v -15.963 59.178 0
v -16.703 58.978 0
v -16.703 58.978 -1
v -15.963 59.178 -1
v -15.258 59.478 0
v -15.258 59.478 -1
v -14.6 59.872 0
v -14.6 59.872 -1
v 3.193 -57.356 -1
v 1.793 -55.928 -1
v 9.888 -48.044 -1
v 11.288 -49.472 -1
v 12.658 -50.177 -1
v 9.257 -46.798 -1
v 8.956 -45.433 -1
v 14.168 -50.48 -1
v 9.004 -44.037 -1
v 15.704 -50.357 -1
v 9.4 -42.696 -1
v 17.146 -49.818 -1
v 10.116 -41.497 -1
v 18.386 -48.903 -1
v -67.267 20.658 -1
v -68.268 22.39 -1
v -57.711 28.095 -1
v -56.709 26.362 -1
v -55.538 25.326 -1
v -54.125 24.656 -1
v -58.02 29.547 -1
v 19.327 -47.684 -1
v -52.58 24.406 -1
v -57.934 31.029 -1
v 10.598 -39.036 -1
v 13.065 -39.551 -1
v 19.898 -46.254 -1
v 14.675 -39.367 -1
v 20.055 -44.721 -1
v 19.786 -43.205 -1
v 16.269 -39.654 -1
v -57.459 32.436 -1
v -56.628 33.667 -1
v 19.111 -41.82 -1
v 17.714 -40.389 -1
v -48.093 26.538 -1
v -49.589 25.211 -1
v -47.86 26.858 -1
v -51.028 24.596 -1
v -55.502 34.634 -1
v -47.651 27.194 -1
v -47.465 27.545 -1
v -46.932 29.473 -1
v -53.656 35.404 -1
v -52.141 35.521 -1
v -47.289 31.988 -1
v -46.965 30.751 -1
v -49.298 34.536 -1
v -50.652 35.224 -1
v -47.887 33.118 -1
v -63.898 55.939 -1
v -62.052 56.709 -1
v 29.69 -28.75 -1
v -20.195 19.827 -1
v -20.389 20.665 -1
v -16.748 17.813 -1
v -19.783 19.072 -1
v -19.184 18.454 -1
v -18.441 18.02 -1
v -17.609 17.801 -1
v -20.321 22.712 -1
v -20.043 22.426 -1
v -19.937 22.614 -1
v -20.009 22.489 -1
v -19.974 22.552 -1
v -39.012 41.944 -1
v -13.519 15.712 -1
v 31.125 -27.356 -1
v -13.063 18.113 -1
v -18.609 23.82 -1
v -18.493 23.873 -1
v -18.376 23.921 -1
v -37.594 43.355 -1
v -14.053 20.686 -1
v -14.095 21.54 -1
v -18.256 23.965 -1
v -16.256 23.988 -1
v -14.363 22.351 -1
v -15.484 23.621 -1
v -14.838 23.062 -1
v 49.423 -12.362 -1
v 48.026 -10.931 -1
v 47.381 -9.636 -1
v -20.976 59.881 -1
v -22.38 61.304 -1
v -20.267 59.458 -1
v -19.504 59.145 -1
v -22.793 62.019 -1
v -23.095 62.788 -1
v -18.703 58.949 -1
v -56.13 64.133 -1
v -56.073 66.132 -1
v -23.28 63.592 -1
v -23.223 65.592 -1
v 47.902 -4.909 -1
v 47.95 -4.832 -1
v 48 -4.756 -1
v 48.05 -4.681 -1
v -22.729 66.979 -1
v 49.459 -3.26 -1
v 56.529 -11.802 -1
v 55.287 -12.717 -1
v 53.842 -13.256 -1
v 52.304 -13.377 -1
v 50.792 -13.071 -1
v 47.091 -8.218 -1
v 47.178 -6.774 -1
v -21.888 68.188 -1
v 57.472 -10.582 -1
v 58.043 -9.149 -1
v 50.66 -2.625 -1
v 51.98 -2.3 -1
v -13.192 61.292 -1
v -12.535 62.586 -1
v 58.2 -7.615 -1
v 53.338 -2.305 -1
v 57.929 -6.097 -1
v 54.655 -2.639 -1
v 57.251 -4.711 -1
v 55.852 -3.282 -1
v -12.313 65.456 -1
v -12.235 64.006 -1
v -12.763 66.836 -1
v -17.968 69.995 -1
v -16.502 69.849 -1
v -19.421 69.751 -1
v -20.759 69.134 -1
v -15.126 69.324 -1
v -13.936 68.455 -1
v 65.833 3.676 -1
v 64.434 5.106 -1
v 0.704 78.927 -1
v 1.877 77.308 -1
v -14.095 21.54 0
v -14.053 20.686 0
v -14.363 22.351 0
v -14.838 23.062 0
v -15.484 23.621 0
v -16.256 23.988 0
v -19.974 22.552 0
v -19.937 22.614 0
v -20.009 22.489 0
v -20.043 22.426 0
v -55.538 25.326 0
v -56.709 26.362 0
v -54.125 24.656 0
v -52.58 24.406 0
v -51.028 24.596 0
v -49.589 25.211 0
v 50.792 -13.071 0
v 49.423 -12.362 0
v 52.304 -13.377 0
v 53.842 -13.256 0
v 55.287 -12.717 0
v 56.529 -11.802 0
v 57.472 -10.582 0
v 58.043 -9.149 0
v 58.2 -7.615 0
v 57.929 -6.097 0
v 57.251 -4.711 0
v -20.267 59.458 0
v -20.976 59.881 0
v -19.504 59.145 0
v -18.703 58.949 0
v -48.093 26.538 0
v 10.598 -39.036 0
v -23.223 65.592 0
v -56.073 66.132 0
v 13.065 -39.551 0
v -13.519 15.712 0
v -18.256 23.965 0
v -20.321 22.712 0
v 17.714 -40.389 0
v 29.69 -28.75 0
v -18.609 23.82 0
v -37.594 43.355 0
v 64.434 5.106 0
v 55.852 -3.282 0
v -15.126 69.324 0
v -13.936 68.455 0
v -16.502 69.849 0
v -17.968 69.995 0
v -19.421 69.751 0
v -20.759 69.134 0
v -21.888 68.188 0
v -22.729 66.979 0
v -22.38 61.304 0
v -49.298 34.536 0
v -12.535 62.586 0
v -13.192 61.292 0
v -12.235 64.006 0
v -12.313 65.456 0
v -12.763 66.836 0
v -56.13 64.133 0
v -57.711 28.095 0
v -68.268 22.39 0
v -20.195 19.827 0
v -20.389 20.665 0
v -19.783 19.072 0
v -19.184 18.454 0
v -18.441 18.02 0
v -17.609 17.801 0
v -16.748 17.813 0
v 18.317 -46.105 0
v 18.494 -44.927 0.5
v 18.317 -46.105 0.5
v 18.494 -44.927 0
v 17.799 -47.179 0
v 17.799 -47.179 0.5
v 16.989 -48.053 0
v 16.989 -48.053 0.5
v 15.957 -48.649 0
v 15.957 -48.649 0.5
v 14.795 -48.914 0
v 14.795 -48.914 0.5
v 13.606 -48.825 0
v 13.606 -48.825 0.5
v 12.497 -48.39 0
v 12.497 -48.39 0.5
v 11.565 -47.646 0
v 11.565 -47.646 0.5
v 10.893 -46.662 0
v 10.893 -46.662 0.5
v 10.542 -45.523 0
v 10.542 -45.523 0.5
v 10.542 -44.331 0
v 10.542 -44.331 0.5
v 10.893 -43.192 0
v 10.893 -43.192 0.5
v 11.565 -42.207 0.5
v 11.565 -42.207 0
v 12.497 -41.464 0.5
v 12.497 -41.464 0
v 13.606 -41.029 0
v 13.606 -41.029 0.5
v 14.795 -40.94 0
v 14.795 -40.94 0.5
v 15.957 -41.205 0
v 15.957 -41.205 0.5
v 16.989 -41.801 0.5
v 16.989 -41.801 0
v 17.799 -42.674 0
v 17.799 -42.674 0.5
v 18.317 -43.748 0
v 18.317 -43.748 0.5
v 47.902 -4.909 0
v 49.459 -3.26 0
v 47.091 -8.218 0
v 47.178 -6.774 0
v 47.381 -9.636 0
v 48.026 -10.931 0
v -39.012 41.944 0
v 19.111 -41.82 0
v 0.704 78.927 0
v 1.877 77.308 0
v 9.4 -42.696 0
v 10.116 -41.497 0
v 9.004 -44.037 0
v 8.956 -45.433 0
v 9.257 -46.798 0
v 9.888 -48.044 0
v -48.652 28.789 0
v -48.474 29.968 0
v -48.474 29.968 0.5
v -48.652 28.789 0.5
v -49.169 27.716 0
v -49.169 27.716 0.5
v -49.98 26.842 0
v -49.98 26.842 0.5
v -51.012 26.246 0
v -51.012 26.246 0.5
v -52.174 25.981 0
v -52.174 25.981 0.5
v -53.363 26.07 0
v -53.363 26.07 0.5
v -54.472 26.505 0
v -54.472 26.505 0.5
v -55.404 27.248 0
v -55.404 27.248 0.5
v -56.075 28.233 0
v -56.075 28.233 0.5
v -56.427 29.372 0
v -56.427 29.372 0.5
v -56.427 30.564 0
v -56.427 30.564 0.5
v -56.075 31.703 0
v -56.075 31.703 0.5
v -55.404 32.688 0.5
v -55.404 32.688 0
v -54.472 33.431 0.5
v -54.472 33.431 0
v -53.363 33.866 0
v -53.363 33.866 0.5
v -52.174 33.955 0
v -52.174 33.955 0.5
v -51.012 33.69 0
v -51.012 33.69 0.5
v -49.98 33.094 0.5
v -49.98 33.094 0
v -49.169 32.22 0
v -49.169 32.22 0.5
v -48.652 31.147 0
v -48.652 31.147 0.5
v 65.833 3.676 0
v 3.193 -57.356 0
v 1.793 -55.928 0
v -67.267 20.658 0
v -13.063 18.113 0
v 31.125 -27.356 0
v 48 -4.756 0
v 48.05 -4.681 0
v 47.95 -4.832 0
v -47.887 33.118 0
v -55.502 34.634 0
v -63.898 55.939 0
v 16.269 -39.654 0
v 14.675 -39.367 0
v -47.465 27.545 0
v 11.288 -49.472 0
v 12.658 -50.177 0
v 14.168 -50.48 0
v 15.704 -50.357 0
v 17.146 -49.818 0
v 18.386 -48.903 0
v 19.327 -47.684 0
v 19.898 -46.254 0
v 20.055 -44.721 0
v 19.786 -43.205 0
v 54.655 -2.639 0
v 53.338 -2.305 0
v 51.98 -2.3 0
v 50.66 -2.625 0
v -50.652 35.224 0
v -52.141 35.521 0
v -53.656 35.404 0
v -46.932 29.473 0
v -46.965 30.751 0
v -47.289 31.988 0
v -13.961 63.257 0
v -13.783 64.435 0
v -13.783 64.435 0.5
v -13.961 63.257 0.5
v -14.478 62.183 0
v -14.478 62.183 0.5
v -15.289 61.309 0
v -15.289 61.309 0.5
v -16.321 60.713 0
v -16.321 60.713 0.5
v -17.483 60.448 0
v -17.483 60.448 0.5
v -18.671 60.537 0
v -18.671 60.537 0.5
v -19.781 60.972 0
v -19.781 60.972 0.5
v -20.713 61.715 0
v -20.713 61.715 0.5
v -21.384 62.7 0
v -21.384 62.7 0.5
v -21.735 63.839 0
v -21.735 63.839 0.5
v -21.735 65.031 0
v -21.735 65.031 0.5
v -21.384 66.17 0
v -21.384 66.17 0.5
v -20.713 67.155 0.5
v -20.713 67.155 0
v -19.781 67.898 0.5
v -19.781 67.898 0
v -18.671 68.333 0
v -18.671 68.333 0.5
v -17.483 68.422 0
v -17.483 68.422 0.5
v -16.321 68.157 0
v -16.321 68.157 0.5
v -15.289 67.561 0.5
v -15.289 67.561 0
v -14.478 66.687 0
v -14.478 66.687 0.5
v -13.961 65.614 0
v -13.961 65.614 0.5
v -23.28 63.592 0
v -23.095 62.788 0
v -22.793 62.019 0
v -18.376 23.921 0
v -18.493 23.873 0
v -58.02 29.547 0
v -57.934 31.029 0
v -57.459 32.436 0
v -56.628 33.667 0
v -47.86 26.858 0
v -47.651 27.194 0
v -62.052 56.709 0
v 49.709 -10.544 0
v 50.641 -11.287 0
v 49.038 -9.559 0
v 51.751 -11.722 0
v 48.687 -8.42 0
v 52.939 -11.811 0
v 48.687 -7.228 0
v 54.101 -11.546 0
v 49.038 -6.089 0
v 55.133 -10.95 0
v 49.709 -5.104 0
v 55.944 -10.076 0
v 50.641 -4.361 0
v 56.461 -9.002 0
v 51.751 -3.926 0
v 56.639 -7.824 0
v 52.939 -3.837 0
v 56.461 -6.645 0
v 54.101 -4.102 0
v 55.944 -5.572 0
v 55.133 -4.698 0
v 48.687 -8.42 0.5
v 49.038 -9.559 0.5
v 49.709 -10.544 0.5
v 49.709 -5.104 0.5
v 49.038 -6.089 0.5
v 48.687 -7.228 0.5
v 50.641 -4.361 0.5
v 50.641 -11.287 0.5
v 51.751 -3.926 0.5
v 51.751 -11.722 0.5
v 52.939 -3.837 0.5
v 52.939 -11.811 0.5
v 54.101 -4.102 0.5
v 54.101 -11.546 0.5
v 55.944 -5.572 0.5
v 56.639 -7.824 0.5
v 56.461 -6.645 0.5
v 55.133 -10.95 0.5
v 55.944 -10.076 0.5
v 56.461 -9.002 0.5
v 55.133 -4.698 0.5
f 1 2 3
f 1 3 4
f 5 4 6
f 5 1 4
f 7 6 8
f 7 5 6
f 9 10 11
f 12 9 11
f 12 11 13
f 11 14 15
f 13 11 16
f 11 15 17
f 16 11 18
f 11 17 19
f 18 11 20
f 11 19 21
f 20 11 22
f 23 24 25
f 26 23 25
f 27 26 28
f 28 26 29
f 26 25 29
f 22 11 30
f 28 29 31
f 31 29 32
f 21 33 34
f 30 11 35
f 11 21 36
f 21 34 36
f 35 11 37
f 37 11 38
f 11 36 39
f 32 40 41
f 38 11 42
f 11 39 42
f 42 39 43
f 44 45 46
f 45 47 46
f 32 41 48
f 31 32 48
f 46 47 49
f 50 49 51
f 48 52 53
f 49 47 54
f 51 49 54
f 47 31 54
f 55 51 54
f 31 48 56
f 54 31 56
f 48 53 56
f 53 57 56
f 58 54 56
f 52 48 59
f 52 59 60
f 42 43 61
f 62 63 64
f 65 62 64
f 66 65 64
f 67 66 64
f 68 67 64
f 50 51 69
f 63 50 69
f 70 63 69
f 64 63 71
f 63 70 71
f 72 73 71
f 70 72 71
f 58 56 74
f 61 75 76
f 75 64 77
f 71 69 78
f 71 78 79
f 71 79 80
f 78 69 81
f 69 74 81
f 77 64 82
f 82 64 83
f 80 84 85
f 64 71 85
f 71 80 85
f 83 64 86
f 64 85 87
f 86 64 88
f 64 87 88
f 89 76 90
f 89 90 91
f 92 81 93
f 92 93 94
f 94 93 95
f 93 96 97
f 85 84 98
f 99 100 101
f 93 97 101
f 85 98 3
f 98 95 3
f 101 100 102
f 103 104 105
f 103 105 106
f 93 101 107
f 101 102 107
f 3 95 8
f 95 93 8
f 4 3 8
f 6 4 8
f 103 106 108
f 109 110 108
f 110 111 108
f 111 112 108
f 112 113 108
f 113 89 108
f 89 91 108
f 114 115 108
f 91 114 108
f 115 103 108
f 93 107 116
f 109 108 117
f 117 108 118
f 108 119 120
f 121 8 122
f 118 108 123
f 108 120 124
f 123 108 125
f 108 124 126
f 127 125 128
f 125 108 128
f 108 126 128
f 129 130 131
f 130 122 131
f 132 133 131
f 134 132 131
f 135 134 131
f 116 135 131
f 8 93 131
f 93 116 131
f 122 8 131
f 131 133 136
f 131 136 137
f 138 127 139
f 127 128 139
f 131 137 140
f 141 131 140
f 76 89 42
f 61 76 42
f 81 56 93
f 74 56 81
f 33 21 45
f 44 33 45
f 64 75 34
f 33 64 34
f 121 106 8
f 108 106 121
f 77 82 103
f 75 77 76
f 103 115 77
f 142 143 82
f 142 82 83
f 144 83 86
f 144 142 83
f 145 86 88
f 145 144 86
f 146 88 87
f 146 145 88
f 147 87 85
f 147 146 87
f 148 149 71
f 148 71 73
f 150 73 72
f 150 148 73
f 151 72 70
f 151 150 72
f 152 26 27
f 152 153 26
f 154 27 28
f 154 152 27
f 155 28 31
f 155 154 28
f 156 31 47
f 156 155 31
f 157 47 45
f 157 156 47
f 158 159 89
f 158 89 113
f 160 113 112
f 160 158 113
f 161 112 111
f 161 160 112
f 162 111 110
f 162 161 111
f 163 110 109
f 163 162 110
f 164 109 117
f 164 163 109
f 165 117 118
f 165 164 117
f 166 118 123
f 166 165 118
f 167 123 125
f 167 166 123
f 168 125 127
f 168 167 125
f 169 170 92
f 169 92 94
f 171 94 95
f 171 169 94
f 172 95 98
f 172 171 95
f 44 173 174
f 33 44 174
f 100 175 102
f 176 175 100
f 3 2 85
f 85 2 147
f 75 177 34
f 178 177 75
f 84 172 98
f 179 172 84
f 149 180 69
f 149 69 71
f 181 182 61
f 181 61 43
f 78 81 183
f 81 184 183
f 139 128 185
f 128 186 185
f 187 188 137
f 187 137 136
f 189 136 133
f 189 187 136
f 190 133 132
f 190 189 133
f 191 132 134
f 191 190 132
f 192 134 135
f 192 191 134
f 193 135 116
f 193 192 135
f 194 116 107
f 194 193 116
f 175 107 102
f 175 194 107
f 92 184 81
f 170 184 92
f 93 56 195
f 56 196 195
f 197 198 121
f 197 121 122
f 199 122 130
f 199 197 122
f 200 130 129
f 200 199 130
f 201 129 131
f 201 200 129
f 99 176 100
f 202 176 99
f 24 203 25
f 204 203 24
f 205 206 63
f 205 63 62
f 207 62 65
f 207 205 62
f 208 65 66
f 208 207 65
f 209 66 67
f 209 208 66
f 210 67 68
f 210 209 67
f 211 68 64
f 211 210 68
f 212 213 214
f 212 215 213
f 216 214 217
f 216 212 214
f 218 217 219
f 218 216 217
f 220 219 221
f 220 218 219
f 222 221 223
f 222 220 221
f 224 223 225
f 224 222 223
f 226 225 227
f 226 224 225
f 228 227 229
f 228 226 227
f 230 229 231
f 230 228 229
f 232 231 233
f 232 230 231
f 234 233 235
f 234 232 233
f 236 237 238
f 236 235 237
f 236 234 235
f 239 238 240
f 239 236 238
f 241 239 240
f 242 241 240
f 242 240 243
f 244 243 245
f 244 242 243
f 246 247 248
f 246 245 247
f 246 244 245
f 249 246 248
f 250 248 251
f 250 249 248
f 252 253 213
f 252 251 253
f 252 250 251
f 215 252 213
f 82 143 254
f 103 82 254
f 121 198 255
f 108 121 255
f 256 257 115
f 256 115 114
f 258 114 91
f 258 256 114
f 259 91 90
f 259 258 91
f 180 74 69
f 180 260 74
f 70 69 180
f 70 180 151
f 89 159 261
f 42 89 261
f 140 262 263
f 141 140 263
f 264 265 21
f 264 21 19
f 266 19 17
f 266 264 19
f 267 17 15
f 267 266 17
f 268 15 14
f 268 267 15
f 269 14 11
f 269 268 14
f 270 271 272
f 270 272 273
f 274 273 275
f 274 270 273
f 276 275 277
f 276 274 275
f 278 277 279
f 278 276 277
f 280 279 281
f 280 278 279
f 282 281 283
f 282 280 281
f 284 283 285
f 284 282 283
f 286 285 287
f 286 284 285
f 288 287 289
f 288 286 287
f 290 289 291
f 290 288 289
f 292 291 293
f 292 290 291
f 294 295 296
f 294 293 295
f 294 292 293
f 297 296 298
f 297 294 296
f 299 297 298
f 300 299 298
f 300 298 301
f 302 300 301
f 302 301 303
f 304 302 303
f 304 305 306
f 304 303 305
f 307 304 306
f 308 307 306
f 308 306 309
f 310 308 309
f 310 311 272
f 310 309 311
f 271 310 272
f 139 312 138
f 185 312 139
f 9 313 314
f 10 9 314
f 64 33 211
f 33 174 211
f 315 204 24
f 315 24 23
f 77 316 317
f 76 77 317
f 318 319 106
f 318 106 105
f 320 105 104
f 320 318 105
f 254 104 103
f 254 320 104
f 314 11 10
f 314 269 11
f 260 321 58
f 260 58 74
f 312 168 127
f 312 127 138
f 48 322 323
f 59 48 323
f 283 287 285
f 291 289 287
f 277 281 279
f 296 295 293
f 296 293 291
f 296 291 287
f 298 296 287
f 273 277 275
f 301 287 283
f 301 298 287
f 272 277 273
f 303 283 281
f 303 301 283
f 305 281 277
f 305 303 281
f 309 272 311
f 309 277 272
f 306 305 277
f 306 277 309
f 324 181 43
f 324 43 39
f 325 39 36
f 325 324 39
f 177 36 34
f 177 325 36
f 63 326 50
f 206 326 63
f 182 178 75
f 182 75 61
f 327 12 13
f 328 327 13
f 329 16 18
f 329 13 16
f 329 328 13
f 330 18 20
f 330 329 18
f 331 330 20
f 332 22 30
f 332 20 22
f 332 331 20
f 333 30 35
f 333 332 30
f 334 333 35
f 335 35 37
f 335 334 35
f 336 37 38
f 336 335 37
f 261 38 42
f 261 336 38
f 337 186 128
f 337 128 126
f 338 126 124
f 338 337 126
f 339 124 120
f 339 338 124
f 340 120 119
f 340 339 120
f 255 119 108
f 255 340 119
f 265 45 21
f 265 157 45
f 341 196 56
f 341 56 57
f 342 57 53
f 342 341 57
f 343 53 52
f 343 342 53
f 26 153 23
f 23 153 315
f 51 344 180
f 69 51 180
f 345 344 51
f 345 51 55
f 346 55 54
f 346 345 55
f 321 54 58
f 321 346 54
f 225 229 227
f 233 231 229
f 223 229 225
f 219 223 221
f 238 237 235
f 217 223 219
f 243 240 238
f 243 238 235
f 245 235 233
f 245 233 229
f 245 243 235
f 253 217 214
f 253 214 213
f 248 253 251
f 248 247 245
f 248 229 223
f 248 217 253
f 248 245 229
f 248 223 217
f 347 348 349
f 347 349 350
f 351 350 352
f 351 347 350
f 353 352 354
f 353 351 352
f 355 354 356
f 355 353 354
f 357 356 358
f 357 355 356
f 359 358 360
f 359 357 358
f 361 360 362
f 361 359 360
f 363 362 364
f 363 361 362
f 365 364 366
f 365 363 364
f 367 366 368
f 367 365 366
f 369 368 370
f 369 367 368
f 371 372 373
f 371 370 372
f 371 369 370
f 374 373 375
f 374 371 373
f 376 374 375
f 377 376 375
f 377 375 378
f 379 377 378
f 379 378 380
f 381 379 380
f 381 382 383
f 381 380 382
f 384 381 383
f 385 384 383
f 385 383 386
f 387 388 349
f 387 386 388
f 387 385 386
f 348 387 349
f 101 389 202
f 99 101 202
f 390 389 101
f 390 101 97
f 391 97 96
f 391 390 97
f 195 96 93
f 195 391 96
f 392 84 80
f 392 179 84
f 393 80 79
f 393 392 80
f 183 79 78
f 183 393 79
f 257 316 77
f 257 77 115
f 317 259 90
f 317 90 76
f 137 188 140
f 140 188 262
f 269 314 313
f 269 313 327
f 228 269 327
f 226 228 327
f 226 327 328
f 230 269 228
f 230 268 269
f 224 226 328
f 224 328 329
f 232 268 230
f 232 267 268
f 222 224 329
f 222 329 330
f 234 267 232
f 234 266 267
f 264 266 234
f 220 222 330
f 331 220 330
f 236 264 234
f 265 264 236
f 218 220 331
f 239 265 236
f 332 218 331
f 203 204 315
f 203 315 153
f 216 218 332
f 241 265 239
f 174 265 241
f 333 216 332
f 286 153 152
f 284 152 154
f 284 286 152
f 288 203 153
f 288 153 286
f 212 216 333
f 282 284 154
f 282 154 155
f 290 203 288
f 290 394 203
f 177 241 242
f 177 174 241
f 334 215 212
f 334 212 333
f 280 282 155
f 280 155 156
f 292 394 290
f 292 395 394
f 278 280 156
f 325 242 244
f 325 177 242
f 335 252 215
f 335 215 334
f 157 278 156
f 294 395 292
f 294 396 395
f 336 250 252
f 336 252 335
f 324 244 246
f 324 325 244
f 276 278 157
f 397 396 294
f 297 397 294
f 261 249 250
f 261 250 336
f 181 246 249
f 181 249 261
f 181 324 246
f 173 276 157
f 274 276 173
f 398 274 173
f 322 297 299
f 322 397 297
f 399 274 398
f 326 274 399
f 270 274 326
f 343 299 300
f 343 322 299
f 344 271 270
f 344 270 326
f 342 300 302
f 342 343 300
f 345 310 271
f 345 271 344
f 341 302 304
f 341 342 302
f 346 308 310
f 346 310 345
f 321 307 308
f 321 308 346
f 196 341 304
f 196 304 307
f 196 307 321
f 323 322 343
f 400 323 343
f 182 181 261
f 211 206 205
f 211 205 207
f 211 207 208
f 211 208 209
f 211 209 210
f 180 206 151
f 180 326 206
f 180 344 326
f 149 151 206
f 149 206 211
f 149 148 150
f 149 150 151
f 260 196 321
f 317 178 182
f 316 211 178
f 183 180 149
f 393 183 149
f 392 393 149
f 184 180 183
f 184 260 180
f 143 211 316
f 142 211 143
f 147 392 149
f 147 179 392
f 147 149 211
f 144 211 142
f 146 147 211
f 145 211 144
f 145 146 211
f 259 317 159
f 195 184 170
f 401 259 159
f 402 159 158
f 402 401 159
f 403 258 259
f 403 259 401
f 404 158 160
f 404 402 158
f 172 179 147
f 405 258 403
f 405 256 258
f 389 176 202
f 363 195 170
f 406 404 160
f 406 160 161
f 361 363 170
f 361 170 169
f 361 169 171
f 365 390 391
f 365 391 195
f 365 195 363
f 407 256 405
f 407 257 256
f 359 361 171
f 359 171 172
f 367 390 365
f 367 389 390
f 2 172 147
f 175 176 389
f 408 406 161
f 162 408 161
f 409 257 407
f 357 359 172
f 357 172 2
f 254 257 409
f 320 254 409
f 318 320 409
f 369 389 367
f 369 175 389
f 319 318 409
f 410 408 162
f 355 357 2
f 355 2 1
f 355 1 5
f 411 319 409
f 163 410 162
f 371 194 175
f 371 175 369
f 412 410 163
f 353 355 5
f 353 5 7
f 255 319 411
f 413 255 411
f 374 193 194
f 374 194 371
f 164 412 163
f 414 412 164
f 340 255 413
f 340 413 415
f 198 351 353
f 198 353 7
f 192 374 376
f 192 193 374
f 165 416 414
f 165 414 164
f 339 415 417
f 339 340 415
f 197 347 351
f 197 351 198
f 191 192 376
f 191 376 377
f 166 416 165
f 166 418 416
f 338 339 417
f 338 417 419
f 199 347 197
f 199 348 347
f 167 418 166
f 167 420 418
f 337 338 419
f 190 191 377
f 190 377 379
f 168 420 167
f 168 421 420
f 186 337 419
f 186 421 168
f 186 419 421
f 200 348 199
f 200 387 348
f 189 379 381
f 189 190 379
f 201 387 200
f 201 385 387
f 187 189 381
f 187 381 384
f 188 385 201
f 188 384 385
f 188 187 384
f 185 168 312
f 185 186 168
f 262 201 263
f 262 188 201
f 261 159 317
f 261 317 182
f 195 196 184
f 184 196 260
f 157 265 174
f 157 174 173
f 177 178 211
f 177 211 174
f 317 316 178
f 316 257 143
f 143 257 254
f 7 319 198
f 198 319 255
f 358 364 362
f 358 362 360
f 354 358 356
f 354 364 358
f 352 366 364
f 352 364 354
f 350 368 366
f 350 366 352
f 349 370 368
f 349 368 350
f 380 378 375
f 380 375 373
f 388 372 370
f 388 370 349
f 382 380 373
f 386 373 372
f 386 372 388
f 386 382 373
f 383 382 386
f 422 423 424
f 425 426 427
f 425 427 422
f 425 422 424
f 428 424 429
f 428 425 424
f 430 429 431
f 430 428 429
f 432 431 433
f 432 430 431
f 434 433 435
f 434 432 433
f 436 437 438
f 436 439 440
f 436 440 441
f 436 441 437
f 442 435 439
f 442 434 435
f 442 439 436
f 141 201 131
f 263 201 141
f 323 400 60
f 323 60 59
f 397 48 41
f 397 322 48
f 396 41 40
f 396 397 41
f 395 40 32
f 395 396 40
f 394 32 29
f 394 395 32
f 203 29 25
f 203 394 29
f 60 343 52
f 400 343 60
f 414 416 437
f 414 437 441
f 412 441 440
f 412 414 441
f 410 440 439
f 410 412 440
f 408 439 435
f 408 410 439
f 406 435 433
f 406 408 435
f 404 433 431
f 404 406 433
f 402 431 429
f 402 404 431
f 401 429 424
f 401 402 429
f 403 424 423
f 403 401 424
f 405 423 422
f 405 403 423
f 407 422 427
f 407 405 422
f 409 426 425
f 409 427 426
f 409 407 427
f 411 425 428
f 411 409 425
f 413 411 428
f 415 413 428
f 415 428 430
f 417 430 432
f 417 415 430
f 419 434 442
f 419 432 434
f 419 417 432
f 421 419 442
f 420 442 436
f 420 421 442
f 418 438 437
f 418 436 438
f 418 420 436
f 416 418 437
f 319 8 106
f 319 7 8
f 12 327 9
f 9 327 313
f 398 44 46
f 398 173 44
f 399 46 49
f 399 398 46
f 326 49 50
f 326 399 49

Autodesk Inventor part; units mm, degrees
ref_plane "YZ Plane" through (0, 0, 0) normal (1, 0, 0) x (0, 1, 0)
ref_plane "XZ Plane" through (0, 0, 0) normal (0, 1, 0) x (-1, 0, 0)
ref_plane "XY Plane" through (0, 0, 0) normal (0, 0, 1) x (1, 0, 0)
sketch "Sketch1" plane through (0, 0, 0) normal (0, 0, 1) x (1, 0, 0)
  line L0 (-49.2977, 34.5359) -> (-22.38, 61.3045)
  line L1 (-47.8874, 33.1177) -> (-20.9698, 59.8864)
  line L2 (-49.2977, 34.5359) -> (-47.8874, 33.1177) construction
  circle A0 centre (-52.4729, 29.968) radius 5.563
  circle A1 centre (-52.4729, 29.968) radius 3.9984
  circle A2 centre (-17.7815, 64.4351) radius 5.563
  circle A3 centre (-17.7815, 64.4351) radius 3.9984
  line L3 (-13.9364, 68.4553) -> (0.7038, 78.9274)
  line L4 (-12.7631, 66.8356) -> (1.8771, 77.3077)
  line L5 (-57.711, 28.0946) -> (-68.2683, 22.3899)
  line L6 (-56.7093, 26.3625) -> (-67.2666, 20.6578)
  line L7 (-49.5894, 25.2106) -> (10.1162, -41.4966)
  circle A4 centre (14.4958, -44.9268) radius 5.563
  circle A5 centre (14.4958, -44.9268) radius 3.9984
  circle A6 centre (52.6405, -7.8239) radius 3.9984
  circle A7 centre (52.6405, -7.8239) radius 5.563
  line L8 (-48.0932, 26.5378) -> (11.6124, -40.1694)
  line L9 (-14.6001, 59.8716) -> (48.0505, -4.6808)
  line L10 (-13.1915, 61.292) -> (49.4591, -3.2604)
  line L11 (49.4227, -12.3618) -> (19.1106, -41.8201)
  line L12 (48.0258, -10.9306) -> (17.7136, -40.3888)
  line L13 (11.2885, -49.4721) -> (3.1929, -57.3557)
  line L14 (9.8883, -48.0441) -> (1.7927, -55.9277)
  line L15 (57.2511, -4.7111) -> (65.8331, 3.6764)
  line L16 (55.8523, -3.2817) -> (64.4343, 5.1058)
  line L17 (-39.0119, 41.9442) -> (29.6903, -28.7495)
  line L18 (-37.5936, 43.3546) -> (31.1246, -27.3556)
  line L19 (-55.5021, 34.6339) -> (-63.8979, 55.9393)
  line L20 (-53.6558, 35.4038) -> (-62.0516, 56.7092)
  line L21 (-23.223, 65.5915) -> (-56.073, 66.1322)
  line L22 (-23.2803, 63.5921) -> (-56.1303, 64.1329)
  circle A8 centre (-17.2221, 20.9576) radius 3.1804
  line L23 (13.0651, -39.5509) -> (-14.9644, 18.7175)
  line L24 (11.2563, -40.4044) -> (-16.7485, 17.8127)
  line L25 (-14.0533, 20.686) -> (47.9022, -4.9092)
  line L26 (-14.8421, 18.848) -> (47.1775, -6.7738)
  line L27 (-18.703, 58.9489) -> (-18.2564, 23.9652)
  line L28 (-16.7032, 58.9776) -> (-16.2565, 23.9879)
  line L29 (-47.4654, 27.5447) -> (-20.389, 20.6653)
  line L30 (-46.932, 29.4728) -> (-19.9371, 22.614)
  line L31 (0.7038, 78.9274) -> (1.8771, 77.3077)
  line L32 (-56.073, 66.1322) -> (-56.1303, 64.1329)
  line L33 (-62.0516, 56.7092) -> (-63.8979, 55.9393)
  line L34 (-68.2683, 22.3899) -> (-67.2666, 20.6578)
  line L35 (3.1929, -57.3557) -> (1.7927, -55.9277)
  line L36 (65.8331, 3.6764) -> (64.4343, 5.1058)
  point P0 (0, 0)
  point P1 (9.143, -43.4122)
  point P2 (-19.963, 60.8956)
  point P3 (18.6755, -41.2556)
  point P4 (19.8991, -43.603)
  point P5 (47.2964, -9.3692)
  point P6 (58.0343, -9.1855)
  point P7 (55.8444, -3.2761)
  point P8 (16.2732, -50.1982)
  point P9 (18.0227, -49.2289)
  point P10 (56.2951, -12.0181)
  point P11 (57.5423, -10.4544)
  point P12 (-20.321, 22.7115)
  point P13 (-20.9757, 59.8805)
  point P14 (-18.6091, 23.8197)
  point P15 (10.5981, -39.0362)
  point P16 (31.0842, -30.1838)
  point P17 (32.5185, -28.7899)
  point P18 (31.1246, -27.3556)
  point P19 (-13.0632, 18.1131)
  point P20 (-13.5186, 15.7119)
  point P21 (29.6903, -28.7495)
  point P22 (-20.0433, 22.4258)
  dimension "d49" = 6.3609
  dimension "d0" = 2
  dimension "d2" = 1
  dimension "d3" = 5.563
  dimension "d4" = 1.5646
  dimension "d6" = 1.5646
  dimension "d8" = 5.563
  dimension "d9" = 2
  dimension "d10" = 170.735
  dimension "d11" = 2
  dimension "d12" = 163.544
  dimension "d13" = 1.5646
  dimension "d17" = 7.9968
  dimension "d18" = 1.5646
  dimension "d19" = 7.9968
  dimension "d21" = 60.4275
  dimension "d22" = 66.8436
  dimension "d24" = 47.2075
  dimension "d25" = 2
  dimension "d26" = 2
  dimension "d27" = 81.433
  dimension "d28" = 93.011
  dimension "d29" = 53.2188
  dimension "d30" = 2
  dimension "d31" = 2
  dimension "d32" = 2
  dimension "d33" = 2
  dimension "d34" = 2
  dimension "d35" = 2
  dimension "d36" = 66.667
  dimension "d37" = 45.784
  dimension "d39" = 92.41
  dimension "d40" = 87.648
  dimension "d42" = 89.8
  dimension "d45" = 1
  dimension "d46" = 18
  dimension "d48" = 2
  dimension "d50" = 53.2132
  dimension "d51" = 27.126
  dimension "d52" = 44.9268
  dimension "d53" = 48.9027
  dimension "d54" = 29.968
  dimension "d55" = 20.9576
  dimension "d56" = 2
  dimension "d57" = 2
  dimension "d58" = 2
  dimension "d59" = 64.6596
  dimension "d60" = 67.0343
  dimension "d61" = 34.9897
  dimension "d62" = 27.8525
  dimension "d63" = 22.9
  dimension "d64" = 12
  dimension "d65" = 32.85
  dimension "d66" = 18
  dimension "d67" = 12
  dimension "d70" = 11.3
  dimension "d71" = 3.8451
  dimension "d72" = 5.4415
  dimension "d73" = 5.4358
  dimension "d74" = 5.2381
  dimension "d75" = 5.5409
  dimension "d76" = 5.4575
  dimension "d77" = 3.1128
  dimension "d78" = 2.6305
  dimension "d79" = 4.3021
extrude "Extrusion3" add sketch "Sketch1" against normal blind 1 contours L0 A2 L1 A0 | A0 | A2 | A0 L19 L33 L20 | L22 L32 L21 A2 | L1 L18 A8 L30 L17 | A2 L28 A8 L27 | L17 A8 L29 A0 L30 | A0 L6 L34 L5 | L3 L31 L4 A2 | A8 L18 | L18 A8 L17 | L17 A8 | A8 L25 A7 L26 L18 | L18 L26 A8 | A2 L10 A7 L9 | A8 L23 L17 | L17 L23 A4 L8 L24 A8 | L8 L24 A4 L7 A0 | L18 L12 L17 L23 A8 L26 | A7 | L8 A4 L24 | A4 | L12 A7 L11 A4 | A4 L13 L35 L14 | L16 L36 L15 A7
sketch "Sketch2" plane through (0, 0, 0) normal (0, 0, 1) x (1, 0, 0)
  circle A0 centre (52.6405, -7.8239) radius 3.9984
  circle A1 centre (52.6405, -7.8239) radius 3.9984 projected
  circle A2 centre (14.4958, -44.9268) radius 3.9984
  circle A3 centre (14.4958, -44.9268) radius 3.9984 projected
  circle A4 centre (-52.4729, 29.968) radius 3.9984
  circle A5 centre (-52.4729, 29.968) radius 3.9984 projected
  circle A6 centre (-17.7815, 64.4351) radius 3.9984
  circle A7 centre (-17.7815, 64.4351) radius 3.9984 projected
  point P0 (0, 0)
extrude "Extrusion2" add sketch "Sketch2" along normal blind 0.5 and the other way blind 1
equation "\"d6\" = d4"
equation "\"d8\" = d3"
equation "\"d13\" = d15"
equation "\"d18\" = d20"
equation "\"d15\" = 1.564594"
equation "\"d20\" = 1.564594"
properties part number "Grundform_Boden"
